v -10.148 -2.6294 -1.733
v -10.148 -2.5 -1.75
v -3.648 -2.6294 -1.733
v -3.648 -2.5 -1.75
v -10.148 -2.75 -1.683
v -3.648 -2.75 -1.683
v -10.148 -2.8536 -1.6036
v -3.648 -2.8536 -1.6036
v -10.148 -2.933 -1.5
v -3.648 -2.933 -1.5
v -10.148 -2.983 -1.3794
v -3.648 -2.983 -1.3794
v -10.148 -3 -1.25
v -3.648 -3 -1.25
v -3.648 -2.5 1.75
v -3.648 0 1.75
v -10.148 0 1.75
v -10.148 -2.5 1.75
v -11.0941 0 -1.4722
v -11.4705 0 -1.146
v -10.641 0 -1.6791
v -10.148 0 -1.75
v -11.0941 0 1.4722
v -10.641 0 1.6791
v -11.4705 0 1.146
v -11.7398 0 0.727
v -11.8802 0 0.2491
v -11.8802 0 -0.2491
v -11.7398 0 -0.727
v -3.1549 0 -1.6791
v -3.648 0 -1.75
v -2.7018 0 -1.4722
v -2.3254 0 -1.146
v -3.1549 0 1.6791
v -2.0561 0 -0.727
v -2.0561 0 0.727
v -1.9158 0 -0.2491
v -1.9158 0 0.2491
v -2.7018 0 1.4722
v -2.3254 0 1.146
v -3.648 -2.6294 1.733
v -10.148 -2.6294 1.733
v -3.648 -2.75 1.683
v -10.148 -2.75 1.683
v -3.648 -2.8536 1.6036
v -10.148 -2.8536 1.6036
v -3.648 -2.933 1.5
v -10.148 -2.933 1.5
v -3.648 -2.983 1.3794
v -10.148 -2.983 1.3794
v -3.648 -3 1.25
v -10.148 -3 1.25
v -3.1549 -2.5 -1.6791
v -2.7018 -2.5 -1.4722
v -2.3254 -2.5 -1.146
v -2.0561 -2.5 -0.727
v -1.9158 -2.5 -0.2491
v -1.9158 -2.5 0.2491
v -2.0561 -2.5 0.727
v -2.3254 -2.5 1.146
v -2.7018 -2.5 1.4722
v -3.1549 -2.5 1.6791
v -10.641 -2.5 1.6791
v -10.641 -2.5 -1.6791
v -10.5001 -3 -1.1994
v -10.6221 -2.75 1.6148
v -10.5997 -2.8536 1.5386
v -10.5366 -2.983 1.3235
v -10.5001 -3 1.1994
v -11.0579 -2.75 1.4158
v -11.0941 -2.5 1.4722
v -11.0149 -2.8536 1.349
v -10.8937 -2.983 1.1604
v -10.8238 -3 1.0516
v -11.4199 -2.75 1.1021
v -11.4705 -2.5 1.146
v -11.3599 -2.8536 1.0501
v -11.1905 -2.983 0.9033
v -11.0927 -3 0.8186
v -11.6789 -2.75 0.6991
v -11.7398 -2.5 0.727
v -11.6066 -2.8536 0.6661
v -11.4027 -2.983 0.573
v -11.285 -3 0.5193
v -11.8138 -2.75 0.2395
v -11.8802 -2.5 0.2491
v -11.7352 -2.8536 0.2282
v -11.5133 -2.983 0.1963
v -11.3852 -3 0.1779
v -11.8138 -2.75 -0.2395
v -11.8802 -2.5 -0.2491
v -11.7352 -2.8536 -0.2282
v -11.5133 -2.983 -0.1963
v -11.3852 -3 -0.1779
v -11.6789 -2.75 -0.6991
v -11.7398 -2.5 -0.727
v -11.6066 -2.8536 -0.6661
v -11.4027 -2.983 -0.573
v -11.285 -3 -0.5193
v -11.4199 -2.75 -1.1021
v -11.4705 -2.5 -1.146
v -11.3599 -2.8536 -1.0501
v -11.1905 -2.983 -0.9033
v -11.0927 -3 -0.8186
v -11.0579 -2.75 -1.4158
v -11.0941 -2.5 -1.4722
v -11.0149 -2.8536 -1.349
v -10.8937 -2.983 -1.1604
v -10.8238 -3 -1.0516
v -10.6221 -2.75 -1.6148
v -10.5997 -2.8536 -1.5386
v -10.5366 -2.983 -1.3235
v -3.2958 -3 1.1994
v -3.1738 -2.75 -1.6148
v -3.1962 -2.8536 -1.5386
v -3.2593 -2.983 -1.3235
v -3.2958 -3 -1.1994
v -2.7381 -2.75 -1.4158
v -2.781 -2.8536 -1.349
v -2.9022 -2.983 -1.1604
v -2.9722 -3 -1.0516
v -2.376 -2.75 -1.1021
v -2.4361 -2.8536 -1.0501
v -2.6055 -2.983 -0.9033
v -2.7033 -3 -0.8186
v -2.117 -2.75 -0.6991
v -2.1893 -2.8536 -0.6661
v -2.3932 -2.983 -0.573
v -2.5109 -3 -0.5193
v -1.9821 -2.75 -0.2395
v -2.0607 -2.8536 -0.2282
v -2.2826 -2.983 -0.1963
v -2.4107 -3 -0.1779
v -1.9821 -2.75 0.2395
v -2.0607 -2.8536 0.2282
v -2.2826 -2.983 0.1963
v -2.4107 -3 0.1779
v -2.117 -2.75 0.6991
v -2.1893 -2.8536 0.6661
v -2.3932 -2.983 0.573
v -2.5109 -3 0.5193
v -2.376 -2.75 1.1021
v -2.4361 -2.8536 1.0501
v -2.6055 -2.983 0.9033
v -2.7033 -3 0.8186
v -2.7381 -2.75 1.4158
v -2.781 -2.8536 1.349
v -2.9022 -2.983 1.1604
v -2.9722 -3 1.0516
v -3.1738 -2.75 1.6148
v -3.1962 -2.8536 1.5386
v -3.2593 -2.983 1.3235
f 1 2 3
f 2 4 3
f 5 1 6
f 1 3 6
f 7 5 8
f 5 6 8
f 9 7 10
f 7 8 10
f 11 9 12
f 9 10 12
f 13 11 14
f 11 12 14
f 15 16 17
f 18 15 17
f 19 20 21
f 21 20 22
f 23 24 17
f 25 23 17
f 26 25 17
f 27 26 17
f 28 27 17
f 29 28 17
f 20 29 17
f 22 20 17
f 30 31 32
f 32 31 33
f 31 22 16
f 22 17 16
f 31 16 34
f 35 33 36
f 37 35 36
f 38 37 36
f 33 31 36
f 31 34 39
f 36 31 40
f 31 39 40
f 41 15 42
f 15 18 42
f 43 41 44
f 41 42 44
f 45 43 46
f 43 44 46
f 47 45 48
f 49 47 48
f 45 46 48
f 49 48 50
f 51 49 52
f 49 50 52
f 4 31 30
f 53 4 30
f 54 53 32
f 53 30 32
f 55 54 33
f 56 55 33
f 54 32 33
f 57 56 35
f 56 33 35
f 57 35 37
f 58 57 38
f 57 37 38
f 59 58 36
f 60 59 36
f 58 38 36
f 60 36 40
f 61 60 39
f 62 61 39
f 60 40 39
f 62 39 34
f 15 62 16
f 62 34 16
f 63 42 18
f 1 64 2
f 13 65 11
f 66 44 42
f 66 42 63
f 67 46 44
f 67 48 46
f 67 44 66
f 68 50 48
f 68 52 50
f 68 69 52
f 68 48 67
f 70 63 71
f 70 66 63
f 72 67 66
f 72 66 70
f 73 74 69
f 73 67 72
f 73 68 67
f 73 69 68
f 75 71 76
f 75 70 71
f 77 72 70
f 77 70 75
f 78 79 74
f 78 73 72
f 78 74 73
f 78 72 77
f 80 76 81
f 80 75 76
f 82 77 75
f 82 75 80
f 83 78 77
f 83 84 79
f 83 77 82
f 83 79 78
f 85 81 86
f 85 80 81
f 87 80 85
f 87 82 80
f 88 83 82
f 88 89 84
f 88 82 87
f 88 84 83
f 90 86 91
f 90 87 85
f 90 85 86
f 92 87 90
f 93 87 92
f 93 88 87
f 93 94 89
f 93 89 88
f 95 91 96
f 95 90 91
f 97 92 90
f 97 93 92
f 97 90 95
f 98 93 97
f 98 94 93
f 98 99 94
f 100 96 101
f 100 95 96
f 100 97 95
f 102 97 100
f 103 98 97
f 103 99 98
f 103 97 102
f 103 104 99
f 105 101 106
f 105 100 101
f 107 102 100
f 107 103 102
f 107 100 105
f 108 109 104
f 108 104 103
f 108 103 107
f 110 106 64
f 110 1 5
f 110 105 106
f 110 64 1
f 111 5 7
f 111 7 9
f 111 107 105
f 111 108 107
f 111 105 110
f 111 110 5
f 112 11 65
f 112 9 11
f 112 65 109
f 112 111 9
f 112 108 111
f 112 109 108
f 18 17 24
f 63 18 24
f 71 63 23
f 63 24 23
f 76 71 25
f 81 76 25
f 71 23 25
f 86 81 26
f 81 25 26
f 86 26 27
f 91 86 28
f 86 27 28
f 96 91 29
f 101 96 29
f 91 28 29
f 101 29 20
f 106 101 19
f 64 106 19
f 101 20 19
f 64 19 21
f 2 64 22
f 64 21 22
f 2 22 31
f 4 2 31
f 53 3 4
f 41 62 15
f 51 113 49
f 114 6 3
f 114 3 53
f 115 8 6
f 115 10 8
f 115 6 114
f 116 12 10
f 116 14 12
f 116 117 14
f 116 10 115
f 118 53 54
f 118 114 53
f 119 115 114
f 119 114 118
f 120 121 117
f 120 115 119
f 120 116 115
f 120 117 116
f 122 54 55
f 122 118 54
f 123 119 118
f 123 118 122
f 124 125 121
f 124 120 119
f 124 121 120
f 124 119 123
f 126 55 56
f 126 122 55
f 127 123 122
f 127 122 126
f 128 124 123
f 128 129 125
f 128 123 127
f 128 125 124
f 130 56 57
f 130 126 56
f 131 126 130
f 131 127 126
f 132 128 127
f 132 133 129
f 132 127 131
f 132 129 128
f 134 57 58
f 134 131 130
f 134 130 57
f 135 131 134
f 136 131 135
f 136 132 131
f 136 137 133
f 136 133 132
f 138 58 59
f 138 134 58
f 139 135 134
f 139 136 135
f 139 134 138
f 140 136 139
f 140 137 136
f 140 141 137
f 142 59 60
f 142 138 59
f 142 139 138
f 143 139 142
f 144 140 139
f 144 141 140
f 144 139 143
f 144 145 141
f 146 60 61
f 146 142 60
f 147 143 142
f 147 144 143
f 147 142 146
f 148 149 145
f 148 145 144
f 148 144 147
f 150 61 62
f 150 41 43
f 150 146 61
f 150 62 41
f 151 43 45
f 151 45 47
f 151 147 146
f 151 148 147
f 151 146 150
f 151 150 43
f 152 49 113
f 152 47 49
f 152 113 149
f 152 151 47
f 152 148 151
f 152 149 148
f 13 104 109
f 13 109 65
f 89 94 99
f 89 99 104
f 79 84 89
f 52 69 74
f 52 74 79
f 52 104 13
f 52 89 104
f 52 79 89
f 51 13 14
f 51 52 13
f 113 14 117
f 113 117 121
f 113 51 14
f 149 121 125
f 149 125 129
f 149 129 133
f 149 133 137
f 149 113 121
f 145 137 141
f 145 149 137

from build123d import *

# Parameters (mm, degrees)
F1_DEPTH = 3
F2_R     = 0.5


with BuildPart() as f1:
    # F0 (on Front) → F1 (new body)
    with BuildSketch(Plane.XZ):
        with BuildLine():
            Line((-3.647967, 1.75), (-10.147967, 1.75))
            ThreePointArc((-10.147967, 1.75), (-11.897967, 0), (-10.147967, -1.75))
            Line((-10.147967, -1.75), (-3.647967, -1.75))
            ThreePointArc((-3.647967, -1.75), (-1.897967, 0), (-3.647967, 1.75))
        make_face()
    extrude(amount=F1_DEPTH)

    # F2
    f2_edges = [f1.edges().sort_by_distance(p)[0] for p in [
        (-6.897967, -3, 1.75),
        (-1.897967, -3, 0),
        (-6.897967, -3, -1.75),
        (-11.897967, -3, 0),
    ]]
    fillet(f2_edges, radius=F2_R)


solid = f1.part
